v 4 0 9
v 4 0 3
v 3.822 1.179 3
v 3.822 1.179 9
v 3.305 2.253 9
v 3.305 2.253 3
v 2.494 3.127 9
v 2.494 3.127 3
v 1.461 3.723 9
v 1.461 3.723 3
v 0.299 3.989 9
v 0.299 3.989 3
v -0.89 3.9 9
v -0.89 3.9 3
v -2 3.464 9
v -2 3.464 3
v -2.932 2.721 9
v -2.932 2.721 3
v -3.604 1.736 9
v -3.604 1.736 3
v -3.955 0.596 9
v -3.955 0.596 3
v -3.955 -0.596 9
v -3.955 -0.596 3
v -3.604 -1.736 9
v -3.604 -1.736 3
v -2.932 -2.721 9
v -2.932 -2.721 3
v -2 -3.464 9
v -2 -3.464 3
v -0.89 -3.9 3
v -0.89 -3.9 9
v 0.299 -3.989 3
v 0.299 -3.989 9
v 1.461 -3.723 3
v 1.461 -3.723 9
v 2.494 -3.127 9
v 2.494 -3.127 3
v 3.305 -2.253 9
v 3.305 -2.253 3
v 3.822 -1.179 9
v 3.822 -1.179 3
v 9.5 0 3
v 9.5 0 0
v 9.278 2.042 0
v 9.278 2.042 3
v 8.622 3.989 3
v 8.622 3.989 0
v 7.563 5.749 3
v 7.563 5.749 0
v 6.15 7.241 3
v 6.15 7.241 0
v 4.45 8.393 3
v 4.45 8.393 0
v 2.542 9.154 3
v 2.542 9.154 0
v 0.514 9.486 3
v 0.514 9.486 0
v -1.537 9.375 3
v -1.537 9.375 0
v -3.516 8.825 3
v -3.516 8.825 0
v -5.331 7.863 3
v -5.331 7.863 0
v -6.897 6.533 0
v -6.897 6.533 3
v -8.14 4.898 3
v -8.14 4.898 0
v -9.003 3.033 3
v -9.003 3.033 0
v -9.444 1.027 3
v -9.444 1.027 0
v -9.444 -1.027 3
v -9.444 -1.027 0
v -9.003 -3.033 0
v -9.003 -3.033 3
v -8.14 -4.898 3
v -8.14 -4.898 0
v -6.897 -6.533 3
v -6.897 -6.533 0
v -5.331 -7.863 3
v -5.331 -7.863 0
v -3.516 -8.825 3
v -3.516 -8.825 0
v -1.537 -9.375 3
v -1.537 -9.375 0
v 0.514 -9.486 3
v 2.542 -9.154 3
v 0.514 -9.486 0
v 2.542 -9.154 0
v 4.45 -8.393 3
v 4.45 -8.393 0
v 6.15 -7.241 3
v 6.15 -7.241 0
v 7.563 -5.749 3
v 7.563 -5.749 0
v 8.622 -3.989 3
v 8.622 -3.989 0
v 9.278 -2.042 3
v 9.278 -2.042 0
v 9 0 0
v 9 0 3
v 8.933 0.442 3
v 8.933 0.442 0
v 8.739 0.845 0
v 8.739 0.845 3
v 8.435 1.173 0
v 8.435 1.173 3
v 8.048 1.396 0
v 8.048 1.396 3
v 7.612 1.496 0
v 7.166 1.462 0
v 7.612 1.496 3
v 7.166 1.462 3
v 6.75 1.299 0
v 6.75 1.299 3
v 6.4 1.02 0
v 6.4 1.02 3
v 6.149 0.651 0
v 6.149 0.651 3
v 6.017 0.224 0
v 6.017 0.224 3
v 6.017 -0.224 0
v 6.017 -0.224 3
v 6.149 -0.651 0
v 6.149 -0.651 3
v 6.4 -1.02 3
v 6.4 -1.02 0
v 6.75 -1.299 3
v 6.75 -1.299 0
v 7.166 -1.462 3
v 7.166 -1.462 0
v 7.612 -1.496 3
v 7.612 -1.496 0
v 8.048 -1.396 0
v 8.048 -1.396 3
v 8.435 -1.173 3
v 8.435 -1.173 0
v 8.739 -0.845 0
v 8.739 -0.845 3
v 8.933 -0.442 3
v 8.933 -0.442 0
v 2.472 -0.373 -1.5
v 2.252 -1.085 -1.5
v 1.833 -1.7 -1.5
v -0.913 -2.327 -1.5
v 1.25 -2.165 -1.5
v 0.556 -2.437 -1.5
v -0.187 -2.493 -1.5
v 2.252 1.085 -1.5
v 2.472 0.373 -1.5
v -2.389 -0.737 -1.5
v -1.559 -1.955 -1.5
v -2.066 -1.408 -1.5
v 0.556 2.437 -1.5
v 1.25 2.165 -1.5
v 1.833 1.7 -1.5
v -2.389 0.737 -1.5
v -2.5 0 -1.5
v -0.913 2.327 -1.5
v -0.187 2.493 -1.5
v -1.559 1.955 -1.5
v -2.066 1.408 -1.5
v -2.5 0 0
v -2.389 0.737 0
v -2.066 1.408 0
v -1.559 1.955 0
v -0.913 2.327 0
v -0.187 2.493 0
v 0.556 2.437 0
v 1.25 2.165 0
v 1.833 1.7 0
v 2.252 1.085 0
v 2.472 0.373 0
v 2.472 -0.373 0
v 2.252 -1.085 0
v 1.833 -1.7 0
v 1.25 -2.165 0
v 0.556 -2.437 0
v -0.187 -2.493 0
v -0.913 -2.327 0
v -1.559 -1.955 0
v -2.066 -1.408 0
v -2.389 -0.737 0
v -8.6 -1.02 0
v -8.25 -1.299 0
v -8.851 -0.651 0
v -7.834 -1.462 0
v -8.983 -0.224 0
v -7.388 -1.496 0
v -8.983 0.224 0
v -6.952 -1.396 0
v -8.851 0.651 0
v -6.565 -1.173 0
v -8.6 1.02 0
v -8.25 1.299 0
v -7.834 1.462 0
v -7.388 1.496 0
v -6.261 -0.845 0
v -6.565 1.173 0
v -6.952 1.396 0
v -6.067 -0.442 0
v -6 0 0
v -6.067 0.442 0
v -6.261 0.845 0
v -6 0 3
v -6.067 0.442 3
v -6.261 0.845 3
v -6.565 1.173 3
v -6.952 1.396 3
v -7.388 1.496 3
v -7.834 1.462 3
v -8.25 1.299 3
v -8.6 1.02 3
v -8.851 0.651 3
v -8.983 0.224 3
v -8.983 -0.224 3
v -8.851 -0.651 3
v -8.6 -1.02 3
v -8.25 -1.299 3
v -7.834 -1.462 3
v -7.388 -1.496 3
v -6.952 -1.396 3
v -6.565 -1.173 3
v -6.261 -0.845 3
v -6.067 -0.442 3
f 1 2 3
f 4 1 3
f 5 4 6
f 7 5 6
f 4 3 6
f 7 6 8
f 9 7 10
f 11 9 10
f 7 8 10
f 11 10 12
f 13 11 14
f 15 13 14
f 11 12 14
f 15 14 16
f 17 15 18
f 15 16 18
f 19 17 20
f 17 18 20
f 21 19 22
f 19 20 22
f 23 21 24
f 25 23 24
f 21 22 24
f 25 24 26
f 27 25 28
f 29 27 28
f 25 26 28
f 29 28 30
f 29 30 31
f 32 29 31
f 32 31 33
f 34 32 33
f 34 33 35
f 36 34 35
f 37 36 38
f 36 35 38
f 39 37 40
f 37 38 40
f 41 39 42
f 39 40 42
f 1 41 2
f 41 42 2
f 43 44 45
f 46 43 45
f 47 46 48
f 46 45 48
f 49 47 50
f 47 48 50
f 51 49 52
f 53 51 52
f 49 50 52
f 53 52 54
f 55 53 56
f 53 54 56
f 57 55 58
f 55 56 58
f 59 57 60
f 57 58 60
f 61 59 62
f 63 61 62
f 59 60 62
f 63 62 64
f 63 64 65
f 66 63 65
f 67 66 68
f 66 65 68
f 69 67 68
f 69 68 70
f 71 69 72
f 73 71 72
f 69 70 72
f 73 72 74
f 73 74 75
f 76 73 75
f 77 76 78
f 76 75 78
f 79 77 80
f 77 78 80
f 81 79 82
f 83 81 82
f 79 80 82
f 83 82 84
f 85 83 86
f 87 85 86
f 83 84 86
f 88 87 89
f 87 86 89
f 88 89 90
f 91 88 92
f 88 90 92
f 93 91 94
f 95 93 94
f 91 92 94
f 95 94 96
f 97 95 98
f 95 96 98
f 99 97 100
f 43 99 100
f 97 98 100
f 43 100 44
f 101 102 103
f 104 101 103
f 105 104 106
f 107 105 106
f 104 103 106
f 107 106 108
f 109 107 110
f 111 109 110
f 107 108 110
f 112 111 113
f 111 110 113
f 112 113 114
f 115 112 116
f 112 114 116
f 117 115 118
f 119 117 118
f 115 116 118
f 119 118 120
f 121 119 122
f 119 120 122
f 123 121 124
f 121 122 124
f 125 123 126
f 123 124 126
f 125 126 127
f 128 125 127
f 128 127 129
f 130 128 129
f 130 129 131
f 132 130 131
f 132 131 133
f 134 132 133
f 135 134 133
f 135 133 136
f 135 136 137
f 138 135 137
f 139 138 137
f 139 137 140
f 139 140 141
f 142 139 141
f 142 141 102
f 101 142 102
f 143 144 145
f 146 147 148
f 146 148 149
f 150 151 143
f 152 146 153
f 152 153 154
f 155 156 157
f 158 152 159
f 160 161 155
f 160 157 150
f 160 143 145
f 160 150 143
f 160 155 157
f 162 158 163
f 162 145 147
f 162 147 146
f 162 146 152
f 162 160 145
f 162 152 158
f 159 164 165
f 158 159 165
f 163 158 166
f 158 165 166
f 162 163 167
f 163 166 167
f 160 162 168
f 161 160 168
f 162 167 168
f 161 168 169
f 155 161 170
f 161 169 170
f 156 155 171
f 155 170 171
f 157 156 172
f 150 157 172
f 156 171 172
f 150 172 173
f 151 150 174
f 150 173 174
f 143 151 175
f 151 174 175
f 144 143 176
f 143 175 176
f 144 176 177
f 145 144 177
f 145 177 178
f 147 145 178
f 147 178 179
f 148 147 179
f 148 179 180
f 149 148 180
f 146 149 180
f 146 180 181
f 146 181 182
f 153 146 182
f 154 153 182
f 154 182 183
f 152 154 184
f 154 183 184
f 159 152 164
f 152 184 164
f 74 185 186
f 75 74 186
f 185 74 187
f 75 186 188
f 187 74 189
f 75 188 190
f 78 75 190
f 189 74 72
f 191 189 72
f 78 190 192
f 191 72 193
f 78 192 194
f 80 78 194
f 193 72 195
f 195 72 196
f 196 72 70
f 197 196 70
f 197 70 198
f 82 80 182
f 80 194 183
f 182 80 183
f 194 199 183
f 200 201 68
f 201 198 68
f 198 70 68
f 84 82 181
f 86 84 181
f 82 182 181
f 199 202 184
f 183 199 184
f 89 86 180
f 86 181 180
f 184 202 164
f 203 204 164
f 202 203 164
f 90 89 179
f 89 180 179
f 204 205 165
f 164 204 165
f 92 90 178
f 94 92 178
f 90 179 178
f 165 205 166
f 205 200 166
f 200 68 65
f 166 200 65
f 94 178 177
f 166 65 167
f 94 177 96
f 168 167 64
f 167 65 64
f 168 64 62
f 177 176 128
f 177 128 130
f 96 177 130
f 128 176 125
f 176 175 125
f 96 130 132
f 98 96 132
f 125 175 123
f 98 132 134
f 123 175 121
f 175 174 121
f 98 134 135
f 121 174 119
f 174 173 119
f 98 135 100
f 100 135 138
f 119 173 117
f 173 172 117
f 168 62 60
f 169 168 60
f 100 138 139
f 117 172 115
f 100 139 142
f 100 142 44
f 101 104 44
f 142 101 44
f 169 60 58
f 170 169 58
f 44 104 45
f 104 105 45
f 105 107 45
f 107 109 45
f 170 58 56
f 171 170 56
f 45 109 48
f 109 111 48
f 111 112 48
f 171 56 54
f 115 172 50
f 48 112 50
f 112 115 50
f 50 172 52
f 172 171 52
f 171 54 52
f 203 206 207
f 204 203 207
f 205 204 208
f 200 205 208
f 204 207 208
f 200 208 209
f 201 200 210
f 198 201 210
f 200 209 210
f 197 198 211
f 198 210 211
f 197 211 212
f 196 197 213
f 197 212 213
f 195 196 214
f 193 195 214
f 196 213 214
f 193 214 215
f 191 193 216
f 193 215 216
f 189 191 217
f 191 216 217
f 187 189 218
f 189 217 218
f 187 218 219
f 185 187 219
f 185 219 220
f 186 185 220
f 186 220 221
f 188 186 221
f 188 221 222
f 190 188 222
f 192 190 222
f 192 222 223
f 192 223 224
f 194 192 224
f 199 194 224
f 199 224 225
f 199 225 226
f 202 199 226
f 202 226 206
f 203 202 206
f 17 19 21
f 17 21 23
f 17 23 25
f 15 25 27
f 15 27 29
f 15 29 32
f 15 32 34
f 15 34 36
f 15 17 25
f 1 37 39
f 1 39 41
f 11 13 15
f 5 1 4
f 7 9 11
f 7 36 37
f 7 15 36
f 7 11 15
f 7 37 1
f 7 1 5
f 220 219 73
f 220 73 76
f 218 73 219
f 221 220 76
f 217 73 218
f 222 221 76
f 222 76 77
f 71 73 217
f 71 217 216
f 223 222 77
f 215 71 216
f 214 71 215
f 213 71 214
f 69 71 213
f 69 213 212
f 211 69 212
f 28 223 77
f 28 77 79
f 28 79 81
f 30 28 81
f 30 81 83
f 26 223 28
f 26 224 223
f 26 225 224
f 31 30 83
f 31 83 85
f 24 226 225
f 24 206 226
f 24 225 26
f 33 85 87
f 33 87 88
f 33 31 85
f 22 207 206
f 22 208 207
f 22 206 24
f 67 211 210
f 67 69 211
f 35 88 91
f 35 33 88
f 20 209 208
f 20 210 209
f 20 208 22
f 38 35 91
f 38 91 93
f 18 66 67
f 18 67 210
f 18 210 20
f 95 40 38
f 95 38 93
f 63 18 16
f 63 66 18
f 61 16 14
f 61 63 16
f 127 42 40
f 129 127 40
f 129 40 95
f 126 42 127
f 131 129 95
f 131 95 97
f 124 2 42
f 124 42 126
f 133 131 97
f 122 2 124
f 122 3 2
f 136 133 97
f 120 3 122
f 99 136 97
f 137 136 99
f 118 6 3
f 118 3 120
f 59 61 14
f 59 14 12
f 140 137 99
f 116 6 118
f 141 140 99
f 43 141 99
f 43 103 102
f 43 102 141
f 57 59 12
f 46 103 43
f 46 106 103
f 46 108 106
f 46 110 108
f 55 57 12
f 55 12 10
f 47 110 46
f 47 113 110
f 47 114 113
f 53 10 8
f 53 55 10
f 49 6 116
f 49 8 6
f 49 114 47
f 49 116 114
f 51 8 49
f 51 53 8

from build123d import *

# Parameters (mm, degrees)
CROQUIS1_R              = 9.5
SALIENTE_EXTRUIR1_DEPTH = 3
CROQUIS2_R              = 4
SALIENTE_EXTRUIR2_DEPTH = 6
CROQUIS3_R              = 2.5
SALIENTE_EXTRUIR3_DEPTH = 1.5
CROQUIS4_R              = 1.5
CORTAR_EXTRUIR1_DEPTH   = 15.71393897


with BuildPart() as part:
    # Croquis1 → Saliente-Extruir1 (new body)
    with BuildSketch(Plane.XY):
        Circle(CROQUIS1_R)
    extrude(amount=SALIENTE_EXTRUIR1_DEPTH)

    # Croquis2 → Saliente-Extruir2 (add)
    with BuildSketch(Plane.XY.offset(3)):
        Circle(CROQUIS2_R)
    extrude(amount=SALIENTE_EXTRUIR2_DEPTH)

    # Croquis3 → Saliente-Extruir3 (add)
    with BuildSketch(Plane(origin=(0, 0, 0), x_dir=(-1, 0, 0), z_dir=(0, 0, -1))):
        Circle(CROQUIS3_R)
    extrude(amount=SALIENTE_EXTRUIR3_DEPTH)

    # Croquis4 → Cortar-Extruir1 (cut, through all)
    with BuildSketch(Plane.XY.offset(3)):
        with Locations((-7.5, 0)):
            Circle(CROQUIS4_R)
        with Locations((7.5, 0)):
            Circle(CROQUIS4_R)
    extrude(amount=-CORTAR_EXTRUIR1_DEPTH, mode=Mode.SUBTRACT)


solid = part.part
